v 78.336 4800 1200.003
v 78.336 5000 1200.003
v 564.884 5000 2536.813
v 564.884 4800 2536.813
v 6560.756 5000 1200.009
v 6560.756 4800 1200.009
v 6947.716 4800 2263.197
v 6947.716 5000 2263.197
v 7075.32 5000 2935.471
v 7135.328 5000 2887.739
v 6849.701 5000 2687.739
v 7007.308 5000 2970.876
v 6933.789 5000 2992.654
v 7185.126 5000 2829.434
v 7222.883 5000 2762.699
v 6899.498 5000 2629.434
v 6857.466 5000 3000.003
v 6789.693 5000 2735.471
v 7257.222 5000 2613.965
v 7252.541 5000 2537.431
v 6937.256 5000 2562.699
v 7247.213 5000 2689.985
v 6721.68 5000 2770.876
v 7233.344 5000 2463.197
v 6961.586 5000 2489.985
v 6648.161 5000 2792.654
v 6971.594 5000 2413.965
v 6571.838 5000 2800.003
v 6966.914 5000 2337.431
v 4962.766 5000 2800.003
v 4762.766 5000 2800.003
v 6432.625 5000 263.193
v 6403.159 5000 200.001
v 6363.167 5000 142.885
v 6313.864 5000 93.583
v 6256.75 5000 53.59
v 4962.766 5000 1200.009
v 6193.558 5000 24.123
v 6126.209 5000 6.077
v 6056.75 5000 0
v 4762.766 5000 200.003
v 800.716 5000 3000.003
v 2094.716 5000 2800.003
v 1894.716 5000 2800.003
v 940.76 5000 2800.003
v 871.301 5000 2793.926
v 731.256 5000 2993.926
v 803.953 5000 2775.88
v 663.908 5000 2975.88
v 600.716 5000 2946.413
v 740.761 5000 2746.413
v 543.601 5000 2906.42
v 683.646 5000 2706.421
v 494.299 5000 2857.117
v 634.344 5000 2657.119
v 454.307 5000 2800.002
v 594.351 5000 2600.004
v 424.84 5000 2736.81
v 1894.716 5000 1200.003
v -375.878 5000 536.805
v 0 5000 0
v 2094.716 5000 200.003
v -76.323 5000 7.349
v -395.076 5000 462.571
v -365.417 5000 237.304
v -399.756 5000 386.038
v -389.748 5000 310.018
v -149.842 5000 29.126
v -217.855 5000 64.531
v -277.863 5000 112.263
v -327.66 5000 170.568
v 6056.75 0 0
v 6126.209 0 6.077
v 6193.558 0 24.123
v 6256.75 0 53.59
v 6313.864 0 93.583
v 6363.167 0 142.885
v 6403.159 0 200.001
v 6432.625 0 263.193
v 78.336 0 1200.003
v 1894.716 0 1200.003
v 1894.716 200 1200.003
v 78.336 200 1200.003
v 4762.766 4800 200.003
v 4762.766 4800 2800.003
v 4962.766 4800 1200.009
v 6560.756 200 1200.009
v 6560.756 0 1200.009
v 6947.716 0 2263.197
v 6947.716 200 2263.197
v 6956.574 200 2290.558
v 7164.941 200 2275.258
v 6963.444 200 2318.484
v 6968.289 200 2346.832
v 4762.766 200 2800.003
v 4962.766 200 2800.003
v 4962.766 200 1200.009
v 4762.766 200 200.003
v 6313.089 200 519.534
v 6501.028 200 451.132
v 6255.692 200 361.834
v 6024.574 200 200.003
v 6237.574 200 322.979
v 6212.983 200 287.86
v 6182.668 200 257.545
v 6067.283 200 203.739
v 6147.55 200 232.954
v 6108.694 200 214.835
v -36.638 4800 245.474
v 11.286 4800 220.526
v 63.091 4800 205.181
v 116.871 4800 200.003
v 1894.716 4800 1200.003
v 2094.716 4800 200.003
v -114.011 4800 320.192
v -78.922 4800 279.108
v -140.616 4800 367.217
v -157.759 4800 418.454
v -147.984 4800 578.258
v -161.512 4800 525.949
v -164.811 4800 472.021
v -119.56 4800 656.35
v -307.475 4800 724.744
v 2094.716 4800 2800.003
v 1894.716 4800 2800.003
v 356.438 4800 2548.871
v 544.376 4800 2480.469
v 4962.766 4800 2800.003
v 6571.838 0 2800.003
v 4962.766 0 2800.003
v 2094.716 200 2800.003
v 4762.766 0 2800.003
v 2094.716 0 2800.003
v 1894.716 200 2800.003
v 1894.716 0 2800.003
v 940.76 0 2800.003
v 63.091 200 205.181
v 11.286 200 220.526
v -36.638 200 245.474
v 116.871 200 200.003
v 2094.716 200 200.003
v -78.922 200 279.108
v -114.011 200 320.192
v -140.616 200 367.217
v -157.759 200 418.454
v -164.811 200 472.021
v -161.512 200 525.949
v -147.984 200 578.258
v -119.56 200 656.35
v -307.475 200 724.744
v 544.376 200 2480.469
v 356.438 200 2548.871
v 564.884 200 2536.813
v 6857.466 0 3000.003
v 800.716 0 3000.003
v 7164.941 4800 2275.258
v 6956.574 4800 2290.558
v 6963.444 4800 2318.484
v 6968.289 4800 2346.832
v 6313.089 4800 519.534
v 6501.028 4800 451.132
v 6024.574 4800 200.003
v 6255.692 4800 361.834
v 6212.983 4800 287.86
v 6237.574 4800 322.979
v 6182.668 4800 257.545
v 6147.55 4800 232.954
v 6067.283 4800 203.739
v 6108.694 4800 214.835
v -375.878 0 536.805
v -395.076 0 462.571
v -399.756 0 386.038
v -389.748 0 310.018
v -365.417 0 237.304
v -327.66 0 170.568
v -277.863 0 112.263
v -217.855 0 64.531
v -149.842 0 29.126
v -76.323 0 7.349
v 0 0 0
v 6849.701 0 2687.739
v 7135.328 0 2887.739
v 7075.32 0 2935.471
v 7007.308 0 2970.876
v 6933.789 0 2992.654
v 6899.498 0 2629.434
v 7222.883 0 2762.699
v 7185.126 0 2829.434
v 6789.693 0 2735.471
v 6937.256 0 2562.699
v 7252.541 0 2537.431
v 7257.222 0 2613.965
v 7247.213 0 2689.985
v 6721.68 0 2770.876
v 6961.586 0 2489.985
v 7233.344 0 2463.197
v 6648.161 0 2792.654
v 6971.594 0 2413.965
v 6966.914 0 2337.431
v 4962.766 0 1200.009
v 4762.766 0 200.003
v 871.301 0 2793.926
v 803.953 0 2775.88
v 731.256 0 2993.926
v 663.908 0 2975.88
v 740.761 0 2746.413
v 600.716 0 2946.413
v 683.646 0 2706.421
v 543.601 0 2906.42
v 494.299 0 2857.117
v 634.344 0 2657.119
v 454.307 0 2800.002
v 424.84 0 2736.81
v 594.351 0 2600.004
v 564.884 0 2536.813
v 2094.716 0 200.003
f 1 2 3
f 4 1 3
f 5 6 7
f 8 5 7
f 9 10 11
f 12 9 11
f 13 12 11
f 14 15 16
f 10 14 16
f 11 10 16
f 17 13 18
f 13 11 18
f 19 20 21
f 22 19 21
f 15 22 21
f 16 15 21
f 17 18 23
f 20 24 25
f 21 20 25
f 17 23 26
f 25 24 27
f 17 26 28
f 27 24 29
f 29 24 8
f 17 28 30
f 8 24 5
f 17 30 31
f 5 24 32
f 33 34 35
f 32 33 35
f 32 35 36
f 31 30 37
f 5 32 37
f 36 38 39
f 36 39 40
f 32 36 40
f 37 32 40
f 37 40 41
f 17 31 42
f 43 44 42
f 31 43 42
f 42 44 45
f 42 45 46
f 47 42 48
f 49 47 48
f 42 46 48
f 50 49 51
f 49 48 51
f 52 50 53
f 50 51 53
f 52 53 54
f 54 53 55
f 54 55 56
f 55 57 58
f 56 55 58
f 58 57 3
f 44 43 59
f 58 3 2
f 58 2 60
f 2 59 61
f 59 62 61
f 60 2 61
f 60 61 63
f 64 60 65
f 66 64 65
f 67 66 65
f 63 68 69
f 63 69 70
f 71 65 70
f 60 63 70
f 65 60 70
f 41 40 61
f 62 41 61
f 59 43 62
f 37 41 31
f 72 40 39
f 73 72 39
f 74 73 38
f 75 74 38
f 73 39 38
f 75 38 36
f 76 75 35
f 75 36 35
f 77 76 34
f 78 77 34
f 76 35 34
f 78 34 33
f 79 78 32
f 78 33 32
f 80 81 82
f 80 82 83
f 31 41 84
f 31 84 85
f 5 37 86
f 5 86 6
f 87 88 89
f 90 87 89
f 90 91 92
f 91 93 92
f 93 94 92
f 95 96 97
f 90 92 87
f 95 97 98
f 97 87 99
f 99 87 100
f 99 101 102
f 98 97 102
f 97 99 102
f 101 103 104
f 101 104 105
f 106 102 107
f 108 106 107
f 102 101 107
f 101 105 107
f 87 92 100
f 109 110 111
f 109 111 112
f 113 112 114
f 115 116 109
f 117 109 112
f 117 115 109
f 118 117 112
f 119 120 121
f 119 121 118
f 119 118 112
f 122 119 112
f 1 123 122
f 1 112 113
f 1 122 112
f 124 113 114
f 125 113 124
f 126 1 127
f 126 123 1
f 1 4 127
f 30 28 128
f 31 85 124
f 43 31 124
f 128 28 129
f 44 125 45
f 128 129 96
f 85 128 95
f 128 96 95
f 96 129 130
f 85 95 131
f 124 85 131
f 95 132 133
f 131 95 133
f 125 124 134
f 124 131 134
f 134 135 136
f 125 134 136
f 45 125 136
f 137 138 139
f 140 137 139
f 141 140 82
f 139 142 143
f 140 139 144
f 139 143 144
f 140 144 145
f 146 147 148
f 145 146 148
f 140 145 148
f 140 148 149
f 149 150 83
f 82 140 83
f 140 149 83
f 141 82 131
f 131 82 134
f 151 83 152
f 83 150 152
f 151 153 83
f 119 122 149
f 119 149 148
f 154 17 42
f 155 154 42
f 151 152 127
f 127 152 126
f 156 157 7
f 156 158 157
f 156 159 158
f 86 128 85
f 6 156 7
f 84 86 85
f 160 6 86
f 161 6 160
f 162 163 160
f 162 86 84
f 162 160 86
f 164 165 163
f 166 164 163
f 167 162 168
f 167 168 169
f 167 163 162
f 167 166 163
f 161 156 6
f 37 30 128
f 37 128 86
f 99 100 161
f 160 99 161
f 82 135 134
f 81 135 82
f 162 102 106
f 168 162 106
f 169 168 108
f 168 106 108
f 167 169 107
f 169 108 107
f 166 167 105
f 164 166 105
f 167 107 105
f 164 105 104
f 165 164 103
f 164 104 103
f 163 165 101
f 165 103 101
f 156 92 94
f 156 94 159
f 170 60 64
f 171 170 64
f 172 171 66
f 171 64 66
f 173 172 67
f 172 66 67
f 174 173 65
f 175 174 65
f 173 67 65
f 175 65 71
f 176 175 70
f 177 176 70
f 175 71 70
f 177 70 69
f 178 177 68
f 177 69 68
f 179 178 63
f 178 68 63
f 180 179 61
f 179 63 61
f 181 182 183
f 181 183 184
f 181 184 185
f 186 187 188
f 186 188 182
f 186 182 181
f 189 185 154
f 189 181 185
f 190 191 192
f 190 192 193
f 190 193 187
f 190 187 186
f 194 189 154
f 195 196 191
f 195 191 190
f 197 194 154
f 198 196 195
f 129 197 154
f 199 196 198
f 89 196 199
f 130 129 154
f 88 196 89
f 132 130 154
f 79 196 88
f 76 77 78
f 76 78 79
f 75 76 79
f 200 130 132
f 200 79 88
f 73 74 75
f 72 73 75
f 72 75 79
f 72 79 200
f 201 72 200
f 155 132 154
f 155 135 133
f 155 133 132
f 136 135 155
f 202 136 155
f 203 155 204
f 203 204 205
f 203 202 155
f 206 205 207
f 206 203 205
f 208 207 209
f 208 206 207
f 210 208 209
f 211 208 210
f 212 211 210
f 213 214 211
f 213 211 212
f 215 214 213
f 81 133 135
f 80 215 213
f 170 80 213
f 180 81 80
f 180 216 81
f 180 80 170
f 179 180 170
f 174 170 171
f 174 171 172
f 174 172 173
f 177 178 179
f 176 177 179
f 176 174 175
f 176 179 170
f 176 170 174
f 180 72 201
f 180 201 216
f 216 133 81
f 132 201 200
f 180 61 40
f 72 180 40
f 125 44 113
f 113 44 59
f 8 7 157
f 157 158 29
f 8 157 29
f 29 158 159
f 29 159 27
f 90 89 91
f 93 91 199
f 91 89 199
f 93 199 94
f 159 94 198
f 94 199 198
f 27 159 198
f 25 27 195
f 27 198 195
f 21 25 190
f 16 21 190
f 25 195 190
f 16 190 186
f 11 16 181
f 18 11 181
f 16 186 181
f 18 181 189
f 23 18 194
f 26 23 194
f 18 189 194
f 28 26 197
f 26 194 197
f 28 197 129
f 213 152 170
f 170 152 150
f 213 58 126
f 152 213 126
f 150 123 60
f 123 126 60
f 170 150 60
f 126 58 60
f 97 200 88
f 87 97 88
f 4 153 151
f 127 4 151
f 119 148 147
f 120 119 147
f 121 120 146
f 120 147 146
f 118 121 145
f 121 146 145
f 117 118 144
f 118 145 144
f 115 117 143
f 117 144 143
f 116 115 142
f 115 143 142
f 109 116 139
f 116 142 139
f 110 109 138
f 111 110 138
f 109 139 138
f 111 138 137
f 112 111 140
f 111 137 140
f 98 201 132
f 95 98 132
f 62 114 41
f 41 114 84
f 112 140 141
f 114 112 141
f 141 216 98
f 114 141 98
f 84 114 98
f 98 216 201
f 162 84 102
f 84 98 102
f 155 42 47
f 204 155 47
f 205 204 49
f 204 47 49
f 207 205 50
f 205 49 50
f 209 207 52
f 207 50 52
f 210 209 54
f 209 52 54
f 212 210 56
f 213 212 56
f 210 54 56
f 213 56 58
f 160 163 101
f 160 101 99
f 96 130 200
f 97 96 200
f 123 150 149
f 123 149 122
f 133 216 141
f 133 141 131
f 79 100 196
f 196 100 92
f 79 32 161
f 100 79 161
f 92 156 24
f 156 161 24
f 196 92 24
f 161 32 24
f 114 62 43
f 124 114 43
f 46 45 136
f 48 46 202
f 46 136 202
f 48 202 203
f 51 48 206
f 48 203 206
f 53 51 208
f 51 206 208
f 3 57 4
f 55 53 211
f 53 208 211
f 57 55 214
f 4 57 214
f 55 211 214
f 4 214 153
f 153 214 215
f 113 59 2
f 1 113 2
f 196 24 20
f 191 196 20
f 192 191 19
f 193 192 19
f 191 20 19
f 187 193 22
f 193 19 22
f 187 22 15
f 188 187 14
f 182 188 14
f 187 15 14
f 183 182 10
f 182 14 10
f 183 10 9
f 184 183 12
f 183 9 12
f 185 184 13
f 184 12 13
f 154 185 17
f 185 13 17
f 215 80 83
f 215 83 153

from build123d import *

# Parameters (mm, degrees)
BOSS_EXTRUDE1_DEPTH = 200
SKETCH2_W           = 2668.05
SKETCH2_H           = 2600
CUT_EXTRUDE1_DEPTH  = 230
BOSS_EXTRUDE2_DEPTH = 4600
SKETCH4_W           = 1941.19
SKETCH4_H           = 4600
CUT_EXTRUDE2_DEPTH  = 400
SKETCH5_W           = 1941.19
SKETCH5_H           = 4600
CUT_EXTRUDE3_DEPTH  = 400


with BuildPart() as part:
    # Sketch1 → Boss-Extrude1 (new body)
    with BuildSketch(Plane(origin=(0, 0, 0), x_dir=(1, 0, 0), z_dir=(0, 1, 0))):
        with BuildLine():
            Line((0, 0), (6056.75, 0))
            ThreePointArc((6056.75, 0), (6286.18, -72.339450634), (6432.625169, -263.192623242))
            Line((6432.625169, -263.192623242), (7233.3436263, -2463.197297837))
            ThreePointArc((7233.3436263, -2463.197297837), (7185.1256028, -2829.434418192), (6857.4656028, -3000.002675837))
            Line((6857.4656028, -3000.002675837), (800.7156028, -3000.002675837))
            ThreePointArc((800.7156028, -3000.002675837), (571.2856028, -2927.663225203), (424.8404338, -2736.810052595))
            Line((424.8404338, -2736.810052595), (-375.8780235, -536.805378))
            ThreePointArc((-375.8780235, -536.805378), (-327.66, -170.568257645), (0, 0))
        make_face()
    boss_extrude1 = extrude(amount=BOSS_EXTRUDE1_DEPTH)

    # Sketch2 → Cut-Extrude1 (cut)
    with BuildSketch(Plane.XZ):
        with BuildLine():
            Line((78.33570102, 1200.002675837), (564.884027877, 2536.812866415))
            ThreePointArc((564.884027877, 2536.812866415), (711.330655008, 2727.664144606), (940.760299746, 2800.002675837))
            Line((940.760299746, 2800.002675837), (1894.71570102, 2800.002675837))
            Line((1894.71570102, 2800.002675837), (1894.71570102, 1200.002675837))
            Line((1894.71570102, 1200.002675837), (78.33570102, 1200.002675837))
        make_face()
        with Locations((3428.74070102, 1500.002675837)):
            Rectangle(SKETCH2_W, SKETCH2_H)
        with BuildLine():
            Line((4962.76570102, 2800.002675837), (4962.76570102, 1200.008507233))
            Line((4962.76570102, 1200.008507233), (6560.75570102, 1200.008507233))
            Line((6560.75570102, 1200.008507233), (6947.716191633, 2263.197297837))
            ThreePointArc((6947.716191633, 2263.197297837), (6899.498168133, 2629.434418192), (6571.838168133, 2800.002675837))
            Line((6571.838168133, 2800.002675837), (4962.76570102, 2800.002675837))
        make_face()
    cut_extrude1 = extrude(amount=-CUT_EXTRUDE1_DEPTH, mode=Mode.SUBTRACT)

    # Sketch3 → Boss-Extrude2 (add)
    with BuildSketch(Plane(origin=(0, 200, 0), x_dir=(1, 0, 0), z_dir=(0, 1, 0))):
        with BuildLine():
            Line((0, 0), (6056.75, 0))
            ThreePointArc((6056.75, 0), (6286.18, -72.339450634), (6432.625169, -263.192623242))
            Line((6432.625169, -263.192623242), (7233.3436263, -2463.197297837))
            ThreePointArc((7233.3436263, -2463.197297837), (7185.1256028, -2829.434418192), (6857.4656028, -3000.002675837))
            Line((6857.4656028, -3000.002675837), (800.7156028, -3000.002675837))
            ThreePointArc((800.7156028, -3000.002675837), (571.2856028, -2927.663225203), (424.8404338, -2736.810052595))
            Line((424.8404338, -2736.810052595), (-375.8780235, -536.805378))
            ThreePointArc((-375.8780235, -536.805378), (-327.66, -170.568257645), (0, 0))
        make_face()
        with BuildLine():
            Line((564.884027877, -2536.812866415), (-147.984381612, -578.257593887))
            ThreePointArc((-147.984381612, -578.257593887), (-114.010573522, -320.192413074), (116.870963738, -200.002675837))
            Line((116.870963738, -200.002675837), (6024.574255854, -200.002675837))
            ThreePointArc((6024.574255854, -200.002675837), (6165.645943267, -244.482684413), (6255.692001343, -361.834291038))
            Line((6255.692001343, -361.834291038), (6947.716191633, -2263.197297837))
            ThreePointArc((6947.716191633, -2263.197297837), (6899.498168133, -2629.434418192), (6571.838168133, -2800.002675837))
            Line((6571.838168133, -2800.002675837), (940.760299746, -2800.002675837))
            ThreePointArc((940.760299746, -2800.002675837), (711.330655008, -2727.664144606), (564.884027877, -2536.812866415))
        make_face(mode=Mode.SUBTRACT)
    extrude(amount=BOSS_EXTRUDE2_DEPTH)

    # Mirror2: Boss-Extrude1, Cut-Extrude1 across plane
    add(boss_extrude1.mirror(Plane.ZX.offset(2500)))
    add(cut_extrude1.mirror(Plane.ZX.offset(2500)), mode=Mode.SUBTRACT)

    # Sketch4 → Cut-Extrude2 (cut)
    with BuildSketch(Plane(origin=(5595.593399291, 0, -2036.584270068), x_dir=(-0.3420134450000002, 0, -0.9396950587500351), z_dir=(0.9396950587500351, 0, -0.3420134450000002))):
        with Locations((-3617.960102004, 2500)):
            Rectangle(SKETCH4_W, SKETCH4_H)
    extrude(amount=-CUT_EXTRUDE2_DEPTH, mode=Mode.SUBTRACT)

    # Sketch5 → Cut-Extrude3 (cut)
    with BuildSketch(Plane(origin=(-504.433361217, 0, 183.594656624), x_dir=(0.34201344499999986, 0, 0.9396950587500352), z_dir=(-0.9396950587500353, 0, 0.34201344499999986))):
        with Locations((1546.4730235, 2500)):
            Rectangle(SKETCH5_W, SKETCH5_H)
    extrude(amount=-CUT_EXTRUDE3_DEPTH, mode=Mode.SUBTRACT)


solid = part.part
